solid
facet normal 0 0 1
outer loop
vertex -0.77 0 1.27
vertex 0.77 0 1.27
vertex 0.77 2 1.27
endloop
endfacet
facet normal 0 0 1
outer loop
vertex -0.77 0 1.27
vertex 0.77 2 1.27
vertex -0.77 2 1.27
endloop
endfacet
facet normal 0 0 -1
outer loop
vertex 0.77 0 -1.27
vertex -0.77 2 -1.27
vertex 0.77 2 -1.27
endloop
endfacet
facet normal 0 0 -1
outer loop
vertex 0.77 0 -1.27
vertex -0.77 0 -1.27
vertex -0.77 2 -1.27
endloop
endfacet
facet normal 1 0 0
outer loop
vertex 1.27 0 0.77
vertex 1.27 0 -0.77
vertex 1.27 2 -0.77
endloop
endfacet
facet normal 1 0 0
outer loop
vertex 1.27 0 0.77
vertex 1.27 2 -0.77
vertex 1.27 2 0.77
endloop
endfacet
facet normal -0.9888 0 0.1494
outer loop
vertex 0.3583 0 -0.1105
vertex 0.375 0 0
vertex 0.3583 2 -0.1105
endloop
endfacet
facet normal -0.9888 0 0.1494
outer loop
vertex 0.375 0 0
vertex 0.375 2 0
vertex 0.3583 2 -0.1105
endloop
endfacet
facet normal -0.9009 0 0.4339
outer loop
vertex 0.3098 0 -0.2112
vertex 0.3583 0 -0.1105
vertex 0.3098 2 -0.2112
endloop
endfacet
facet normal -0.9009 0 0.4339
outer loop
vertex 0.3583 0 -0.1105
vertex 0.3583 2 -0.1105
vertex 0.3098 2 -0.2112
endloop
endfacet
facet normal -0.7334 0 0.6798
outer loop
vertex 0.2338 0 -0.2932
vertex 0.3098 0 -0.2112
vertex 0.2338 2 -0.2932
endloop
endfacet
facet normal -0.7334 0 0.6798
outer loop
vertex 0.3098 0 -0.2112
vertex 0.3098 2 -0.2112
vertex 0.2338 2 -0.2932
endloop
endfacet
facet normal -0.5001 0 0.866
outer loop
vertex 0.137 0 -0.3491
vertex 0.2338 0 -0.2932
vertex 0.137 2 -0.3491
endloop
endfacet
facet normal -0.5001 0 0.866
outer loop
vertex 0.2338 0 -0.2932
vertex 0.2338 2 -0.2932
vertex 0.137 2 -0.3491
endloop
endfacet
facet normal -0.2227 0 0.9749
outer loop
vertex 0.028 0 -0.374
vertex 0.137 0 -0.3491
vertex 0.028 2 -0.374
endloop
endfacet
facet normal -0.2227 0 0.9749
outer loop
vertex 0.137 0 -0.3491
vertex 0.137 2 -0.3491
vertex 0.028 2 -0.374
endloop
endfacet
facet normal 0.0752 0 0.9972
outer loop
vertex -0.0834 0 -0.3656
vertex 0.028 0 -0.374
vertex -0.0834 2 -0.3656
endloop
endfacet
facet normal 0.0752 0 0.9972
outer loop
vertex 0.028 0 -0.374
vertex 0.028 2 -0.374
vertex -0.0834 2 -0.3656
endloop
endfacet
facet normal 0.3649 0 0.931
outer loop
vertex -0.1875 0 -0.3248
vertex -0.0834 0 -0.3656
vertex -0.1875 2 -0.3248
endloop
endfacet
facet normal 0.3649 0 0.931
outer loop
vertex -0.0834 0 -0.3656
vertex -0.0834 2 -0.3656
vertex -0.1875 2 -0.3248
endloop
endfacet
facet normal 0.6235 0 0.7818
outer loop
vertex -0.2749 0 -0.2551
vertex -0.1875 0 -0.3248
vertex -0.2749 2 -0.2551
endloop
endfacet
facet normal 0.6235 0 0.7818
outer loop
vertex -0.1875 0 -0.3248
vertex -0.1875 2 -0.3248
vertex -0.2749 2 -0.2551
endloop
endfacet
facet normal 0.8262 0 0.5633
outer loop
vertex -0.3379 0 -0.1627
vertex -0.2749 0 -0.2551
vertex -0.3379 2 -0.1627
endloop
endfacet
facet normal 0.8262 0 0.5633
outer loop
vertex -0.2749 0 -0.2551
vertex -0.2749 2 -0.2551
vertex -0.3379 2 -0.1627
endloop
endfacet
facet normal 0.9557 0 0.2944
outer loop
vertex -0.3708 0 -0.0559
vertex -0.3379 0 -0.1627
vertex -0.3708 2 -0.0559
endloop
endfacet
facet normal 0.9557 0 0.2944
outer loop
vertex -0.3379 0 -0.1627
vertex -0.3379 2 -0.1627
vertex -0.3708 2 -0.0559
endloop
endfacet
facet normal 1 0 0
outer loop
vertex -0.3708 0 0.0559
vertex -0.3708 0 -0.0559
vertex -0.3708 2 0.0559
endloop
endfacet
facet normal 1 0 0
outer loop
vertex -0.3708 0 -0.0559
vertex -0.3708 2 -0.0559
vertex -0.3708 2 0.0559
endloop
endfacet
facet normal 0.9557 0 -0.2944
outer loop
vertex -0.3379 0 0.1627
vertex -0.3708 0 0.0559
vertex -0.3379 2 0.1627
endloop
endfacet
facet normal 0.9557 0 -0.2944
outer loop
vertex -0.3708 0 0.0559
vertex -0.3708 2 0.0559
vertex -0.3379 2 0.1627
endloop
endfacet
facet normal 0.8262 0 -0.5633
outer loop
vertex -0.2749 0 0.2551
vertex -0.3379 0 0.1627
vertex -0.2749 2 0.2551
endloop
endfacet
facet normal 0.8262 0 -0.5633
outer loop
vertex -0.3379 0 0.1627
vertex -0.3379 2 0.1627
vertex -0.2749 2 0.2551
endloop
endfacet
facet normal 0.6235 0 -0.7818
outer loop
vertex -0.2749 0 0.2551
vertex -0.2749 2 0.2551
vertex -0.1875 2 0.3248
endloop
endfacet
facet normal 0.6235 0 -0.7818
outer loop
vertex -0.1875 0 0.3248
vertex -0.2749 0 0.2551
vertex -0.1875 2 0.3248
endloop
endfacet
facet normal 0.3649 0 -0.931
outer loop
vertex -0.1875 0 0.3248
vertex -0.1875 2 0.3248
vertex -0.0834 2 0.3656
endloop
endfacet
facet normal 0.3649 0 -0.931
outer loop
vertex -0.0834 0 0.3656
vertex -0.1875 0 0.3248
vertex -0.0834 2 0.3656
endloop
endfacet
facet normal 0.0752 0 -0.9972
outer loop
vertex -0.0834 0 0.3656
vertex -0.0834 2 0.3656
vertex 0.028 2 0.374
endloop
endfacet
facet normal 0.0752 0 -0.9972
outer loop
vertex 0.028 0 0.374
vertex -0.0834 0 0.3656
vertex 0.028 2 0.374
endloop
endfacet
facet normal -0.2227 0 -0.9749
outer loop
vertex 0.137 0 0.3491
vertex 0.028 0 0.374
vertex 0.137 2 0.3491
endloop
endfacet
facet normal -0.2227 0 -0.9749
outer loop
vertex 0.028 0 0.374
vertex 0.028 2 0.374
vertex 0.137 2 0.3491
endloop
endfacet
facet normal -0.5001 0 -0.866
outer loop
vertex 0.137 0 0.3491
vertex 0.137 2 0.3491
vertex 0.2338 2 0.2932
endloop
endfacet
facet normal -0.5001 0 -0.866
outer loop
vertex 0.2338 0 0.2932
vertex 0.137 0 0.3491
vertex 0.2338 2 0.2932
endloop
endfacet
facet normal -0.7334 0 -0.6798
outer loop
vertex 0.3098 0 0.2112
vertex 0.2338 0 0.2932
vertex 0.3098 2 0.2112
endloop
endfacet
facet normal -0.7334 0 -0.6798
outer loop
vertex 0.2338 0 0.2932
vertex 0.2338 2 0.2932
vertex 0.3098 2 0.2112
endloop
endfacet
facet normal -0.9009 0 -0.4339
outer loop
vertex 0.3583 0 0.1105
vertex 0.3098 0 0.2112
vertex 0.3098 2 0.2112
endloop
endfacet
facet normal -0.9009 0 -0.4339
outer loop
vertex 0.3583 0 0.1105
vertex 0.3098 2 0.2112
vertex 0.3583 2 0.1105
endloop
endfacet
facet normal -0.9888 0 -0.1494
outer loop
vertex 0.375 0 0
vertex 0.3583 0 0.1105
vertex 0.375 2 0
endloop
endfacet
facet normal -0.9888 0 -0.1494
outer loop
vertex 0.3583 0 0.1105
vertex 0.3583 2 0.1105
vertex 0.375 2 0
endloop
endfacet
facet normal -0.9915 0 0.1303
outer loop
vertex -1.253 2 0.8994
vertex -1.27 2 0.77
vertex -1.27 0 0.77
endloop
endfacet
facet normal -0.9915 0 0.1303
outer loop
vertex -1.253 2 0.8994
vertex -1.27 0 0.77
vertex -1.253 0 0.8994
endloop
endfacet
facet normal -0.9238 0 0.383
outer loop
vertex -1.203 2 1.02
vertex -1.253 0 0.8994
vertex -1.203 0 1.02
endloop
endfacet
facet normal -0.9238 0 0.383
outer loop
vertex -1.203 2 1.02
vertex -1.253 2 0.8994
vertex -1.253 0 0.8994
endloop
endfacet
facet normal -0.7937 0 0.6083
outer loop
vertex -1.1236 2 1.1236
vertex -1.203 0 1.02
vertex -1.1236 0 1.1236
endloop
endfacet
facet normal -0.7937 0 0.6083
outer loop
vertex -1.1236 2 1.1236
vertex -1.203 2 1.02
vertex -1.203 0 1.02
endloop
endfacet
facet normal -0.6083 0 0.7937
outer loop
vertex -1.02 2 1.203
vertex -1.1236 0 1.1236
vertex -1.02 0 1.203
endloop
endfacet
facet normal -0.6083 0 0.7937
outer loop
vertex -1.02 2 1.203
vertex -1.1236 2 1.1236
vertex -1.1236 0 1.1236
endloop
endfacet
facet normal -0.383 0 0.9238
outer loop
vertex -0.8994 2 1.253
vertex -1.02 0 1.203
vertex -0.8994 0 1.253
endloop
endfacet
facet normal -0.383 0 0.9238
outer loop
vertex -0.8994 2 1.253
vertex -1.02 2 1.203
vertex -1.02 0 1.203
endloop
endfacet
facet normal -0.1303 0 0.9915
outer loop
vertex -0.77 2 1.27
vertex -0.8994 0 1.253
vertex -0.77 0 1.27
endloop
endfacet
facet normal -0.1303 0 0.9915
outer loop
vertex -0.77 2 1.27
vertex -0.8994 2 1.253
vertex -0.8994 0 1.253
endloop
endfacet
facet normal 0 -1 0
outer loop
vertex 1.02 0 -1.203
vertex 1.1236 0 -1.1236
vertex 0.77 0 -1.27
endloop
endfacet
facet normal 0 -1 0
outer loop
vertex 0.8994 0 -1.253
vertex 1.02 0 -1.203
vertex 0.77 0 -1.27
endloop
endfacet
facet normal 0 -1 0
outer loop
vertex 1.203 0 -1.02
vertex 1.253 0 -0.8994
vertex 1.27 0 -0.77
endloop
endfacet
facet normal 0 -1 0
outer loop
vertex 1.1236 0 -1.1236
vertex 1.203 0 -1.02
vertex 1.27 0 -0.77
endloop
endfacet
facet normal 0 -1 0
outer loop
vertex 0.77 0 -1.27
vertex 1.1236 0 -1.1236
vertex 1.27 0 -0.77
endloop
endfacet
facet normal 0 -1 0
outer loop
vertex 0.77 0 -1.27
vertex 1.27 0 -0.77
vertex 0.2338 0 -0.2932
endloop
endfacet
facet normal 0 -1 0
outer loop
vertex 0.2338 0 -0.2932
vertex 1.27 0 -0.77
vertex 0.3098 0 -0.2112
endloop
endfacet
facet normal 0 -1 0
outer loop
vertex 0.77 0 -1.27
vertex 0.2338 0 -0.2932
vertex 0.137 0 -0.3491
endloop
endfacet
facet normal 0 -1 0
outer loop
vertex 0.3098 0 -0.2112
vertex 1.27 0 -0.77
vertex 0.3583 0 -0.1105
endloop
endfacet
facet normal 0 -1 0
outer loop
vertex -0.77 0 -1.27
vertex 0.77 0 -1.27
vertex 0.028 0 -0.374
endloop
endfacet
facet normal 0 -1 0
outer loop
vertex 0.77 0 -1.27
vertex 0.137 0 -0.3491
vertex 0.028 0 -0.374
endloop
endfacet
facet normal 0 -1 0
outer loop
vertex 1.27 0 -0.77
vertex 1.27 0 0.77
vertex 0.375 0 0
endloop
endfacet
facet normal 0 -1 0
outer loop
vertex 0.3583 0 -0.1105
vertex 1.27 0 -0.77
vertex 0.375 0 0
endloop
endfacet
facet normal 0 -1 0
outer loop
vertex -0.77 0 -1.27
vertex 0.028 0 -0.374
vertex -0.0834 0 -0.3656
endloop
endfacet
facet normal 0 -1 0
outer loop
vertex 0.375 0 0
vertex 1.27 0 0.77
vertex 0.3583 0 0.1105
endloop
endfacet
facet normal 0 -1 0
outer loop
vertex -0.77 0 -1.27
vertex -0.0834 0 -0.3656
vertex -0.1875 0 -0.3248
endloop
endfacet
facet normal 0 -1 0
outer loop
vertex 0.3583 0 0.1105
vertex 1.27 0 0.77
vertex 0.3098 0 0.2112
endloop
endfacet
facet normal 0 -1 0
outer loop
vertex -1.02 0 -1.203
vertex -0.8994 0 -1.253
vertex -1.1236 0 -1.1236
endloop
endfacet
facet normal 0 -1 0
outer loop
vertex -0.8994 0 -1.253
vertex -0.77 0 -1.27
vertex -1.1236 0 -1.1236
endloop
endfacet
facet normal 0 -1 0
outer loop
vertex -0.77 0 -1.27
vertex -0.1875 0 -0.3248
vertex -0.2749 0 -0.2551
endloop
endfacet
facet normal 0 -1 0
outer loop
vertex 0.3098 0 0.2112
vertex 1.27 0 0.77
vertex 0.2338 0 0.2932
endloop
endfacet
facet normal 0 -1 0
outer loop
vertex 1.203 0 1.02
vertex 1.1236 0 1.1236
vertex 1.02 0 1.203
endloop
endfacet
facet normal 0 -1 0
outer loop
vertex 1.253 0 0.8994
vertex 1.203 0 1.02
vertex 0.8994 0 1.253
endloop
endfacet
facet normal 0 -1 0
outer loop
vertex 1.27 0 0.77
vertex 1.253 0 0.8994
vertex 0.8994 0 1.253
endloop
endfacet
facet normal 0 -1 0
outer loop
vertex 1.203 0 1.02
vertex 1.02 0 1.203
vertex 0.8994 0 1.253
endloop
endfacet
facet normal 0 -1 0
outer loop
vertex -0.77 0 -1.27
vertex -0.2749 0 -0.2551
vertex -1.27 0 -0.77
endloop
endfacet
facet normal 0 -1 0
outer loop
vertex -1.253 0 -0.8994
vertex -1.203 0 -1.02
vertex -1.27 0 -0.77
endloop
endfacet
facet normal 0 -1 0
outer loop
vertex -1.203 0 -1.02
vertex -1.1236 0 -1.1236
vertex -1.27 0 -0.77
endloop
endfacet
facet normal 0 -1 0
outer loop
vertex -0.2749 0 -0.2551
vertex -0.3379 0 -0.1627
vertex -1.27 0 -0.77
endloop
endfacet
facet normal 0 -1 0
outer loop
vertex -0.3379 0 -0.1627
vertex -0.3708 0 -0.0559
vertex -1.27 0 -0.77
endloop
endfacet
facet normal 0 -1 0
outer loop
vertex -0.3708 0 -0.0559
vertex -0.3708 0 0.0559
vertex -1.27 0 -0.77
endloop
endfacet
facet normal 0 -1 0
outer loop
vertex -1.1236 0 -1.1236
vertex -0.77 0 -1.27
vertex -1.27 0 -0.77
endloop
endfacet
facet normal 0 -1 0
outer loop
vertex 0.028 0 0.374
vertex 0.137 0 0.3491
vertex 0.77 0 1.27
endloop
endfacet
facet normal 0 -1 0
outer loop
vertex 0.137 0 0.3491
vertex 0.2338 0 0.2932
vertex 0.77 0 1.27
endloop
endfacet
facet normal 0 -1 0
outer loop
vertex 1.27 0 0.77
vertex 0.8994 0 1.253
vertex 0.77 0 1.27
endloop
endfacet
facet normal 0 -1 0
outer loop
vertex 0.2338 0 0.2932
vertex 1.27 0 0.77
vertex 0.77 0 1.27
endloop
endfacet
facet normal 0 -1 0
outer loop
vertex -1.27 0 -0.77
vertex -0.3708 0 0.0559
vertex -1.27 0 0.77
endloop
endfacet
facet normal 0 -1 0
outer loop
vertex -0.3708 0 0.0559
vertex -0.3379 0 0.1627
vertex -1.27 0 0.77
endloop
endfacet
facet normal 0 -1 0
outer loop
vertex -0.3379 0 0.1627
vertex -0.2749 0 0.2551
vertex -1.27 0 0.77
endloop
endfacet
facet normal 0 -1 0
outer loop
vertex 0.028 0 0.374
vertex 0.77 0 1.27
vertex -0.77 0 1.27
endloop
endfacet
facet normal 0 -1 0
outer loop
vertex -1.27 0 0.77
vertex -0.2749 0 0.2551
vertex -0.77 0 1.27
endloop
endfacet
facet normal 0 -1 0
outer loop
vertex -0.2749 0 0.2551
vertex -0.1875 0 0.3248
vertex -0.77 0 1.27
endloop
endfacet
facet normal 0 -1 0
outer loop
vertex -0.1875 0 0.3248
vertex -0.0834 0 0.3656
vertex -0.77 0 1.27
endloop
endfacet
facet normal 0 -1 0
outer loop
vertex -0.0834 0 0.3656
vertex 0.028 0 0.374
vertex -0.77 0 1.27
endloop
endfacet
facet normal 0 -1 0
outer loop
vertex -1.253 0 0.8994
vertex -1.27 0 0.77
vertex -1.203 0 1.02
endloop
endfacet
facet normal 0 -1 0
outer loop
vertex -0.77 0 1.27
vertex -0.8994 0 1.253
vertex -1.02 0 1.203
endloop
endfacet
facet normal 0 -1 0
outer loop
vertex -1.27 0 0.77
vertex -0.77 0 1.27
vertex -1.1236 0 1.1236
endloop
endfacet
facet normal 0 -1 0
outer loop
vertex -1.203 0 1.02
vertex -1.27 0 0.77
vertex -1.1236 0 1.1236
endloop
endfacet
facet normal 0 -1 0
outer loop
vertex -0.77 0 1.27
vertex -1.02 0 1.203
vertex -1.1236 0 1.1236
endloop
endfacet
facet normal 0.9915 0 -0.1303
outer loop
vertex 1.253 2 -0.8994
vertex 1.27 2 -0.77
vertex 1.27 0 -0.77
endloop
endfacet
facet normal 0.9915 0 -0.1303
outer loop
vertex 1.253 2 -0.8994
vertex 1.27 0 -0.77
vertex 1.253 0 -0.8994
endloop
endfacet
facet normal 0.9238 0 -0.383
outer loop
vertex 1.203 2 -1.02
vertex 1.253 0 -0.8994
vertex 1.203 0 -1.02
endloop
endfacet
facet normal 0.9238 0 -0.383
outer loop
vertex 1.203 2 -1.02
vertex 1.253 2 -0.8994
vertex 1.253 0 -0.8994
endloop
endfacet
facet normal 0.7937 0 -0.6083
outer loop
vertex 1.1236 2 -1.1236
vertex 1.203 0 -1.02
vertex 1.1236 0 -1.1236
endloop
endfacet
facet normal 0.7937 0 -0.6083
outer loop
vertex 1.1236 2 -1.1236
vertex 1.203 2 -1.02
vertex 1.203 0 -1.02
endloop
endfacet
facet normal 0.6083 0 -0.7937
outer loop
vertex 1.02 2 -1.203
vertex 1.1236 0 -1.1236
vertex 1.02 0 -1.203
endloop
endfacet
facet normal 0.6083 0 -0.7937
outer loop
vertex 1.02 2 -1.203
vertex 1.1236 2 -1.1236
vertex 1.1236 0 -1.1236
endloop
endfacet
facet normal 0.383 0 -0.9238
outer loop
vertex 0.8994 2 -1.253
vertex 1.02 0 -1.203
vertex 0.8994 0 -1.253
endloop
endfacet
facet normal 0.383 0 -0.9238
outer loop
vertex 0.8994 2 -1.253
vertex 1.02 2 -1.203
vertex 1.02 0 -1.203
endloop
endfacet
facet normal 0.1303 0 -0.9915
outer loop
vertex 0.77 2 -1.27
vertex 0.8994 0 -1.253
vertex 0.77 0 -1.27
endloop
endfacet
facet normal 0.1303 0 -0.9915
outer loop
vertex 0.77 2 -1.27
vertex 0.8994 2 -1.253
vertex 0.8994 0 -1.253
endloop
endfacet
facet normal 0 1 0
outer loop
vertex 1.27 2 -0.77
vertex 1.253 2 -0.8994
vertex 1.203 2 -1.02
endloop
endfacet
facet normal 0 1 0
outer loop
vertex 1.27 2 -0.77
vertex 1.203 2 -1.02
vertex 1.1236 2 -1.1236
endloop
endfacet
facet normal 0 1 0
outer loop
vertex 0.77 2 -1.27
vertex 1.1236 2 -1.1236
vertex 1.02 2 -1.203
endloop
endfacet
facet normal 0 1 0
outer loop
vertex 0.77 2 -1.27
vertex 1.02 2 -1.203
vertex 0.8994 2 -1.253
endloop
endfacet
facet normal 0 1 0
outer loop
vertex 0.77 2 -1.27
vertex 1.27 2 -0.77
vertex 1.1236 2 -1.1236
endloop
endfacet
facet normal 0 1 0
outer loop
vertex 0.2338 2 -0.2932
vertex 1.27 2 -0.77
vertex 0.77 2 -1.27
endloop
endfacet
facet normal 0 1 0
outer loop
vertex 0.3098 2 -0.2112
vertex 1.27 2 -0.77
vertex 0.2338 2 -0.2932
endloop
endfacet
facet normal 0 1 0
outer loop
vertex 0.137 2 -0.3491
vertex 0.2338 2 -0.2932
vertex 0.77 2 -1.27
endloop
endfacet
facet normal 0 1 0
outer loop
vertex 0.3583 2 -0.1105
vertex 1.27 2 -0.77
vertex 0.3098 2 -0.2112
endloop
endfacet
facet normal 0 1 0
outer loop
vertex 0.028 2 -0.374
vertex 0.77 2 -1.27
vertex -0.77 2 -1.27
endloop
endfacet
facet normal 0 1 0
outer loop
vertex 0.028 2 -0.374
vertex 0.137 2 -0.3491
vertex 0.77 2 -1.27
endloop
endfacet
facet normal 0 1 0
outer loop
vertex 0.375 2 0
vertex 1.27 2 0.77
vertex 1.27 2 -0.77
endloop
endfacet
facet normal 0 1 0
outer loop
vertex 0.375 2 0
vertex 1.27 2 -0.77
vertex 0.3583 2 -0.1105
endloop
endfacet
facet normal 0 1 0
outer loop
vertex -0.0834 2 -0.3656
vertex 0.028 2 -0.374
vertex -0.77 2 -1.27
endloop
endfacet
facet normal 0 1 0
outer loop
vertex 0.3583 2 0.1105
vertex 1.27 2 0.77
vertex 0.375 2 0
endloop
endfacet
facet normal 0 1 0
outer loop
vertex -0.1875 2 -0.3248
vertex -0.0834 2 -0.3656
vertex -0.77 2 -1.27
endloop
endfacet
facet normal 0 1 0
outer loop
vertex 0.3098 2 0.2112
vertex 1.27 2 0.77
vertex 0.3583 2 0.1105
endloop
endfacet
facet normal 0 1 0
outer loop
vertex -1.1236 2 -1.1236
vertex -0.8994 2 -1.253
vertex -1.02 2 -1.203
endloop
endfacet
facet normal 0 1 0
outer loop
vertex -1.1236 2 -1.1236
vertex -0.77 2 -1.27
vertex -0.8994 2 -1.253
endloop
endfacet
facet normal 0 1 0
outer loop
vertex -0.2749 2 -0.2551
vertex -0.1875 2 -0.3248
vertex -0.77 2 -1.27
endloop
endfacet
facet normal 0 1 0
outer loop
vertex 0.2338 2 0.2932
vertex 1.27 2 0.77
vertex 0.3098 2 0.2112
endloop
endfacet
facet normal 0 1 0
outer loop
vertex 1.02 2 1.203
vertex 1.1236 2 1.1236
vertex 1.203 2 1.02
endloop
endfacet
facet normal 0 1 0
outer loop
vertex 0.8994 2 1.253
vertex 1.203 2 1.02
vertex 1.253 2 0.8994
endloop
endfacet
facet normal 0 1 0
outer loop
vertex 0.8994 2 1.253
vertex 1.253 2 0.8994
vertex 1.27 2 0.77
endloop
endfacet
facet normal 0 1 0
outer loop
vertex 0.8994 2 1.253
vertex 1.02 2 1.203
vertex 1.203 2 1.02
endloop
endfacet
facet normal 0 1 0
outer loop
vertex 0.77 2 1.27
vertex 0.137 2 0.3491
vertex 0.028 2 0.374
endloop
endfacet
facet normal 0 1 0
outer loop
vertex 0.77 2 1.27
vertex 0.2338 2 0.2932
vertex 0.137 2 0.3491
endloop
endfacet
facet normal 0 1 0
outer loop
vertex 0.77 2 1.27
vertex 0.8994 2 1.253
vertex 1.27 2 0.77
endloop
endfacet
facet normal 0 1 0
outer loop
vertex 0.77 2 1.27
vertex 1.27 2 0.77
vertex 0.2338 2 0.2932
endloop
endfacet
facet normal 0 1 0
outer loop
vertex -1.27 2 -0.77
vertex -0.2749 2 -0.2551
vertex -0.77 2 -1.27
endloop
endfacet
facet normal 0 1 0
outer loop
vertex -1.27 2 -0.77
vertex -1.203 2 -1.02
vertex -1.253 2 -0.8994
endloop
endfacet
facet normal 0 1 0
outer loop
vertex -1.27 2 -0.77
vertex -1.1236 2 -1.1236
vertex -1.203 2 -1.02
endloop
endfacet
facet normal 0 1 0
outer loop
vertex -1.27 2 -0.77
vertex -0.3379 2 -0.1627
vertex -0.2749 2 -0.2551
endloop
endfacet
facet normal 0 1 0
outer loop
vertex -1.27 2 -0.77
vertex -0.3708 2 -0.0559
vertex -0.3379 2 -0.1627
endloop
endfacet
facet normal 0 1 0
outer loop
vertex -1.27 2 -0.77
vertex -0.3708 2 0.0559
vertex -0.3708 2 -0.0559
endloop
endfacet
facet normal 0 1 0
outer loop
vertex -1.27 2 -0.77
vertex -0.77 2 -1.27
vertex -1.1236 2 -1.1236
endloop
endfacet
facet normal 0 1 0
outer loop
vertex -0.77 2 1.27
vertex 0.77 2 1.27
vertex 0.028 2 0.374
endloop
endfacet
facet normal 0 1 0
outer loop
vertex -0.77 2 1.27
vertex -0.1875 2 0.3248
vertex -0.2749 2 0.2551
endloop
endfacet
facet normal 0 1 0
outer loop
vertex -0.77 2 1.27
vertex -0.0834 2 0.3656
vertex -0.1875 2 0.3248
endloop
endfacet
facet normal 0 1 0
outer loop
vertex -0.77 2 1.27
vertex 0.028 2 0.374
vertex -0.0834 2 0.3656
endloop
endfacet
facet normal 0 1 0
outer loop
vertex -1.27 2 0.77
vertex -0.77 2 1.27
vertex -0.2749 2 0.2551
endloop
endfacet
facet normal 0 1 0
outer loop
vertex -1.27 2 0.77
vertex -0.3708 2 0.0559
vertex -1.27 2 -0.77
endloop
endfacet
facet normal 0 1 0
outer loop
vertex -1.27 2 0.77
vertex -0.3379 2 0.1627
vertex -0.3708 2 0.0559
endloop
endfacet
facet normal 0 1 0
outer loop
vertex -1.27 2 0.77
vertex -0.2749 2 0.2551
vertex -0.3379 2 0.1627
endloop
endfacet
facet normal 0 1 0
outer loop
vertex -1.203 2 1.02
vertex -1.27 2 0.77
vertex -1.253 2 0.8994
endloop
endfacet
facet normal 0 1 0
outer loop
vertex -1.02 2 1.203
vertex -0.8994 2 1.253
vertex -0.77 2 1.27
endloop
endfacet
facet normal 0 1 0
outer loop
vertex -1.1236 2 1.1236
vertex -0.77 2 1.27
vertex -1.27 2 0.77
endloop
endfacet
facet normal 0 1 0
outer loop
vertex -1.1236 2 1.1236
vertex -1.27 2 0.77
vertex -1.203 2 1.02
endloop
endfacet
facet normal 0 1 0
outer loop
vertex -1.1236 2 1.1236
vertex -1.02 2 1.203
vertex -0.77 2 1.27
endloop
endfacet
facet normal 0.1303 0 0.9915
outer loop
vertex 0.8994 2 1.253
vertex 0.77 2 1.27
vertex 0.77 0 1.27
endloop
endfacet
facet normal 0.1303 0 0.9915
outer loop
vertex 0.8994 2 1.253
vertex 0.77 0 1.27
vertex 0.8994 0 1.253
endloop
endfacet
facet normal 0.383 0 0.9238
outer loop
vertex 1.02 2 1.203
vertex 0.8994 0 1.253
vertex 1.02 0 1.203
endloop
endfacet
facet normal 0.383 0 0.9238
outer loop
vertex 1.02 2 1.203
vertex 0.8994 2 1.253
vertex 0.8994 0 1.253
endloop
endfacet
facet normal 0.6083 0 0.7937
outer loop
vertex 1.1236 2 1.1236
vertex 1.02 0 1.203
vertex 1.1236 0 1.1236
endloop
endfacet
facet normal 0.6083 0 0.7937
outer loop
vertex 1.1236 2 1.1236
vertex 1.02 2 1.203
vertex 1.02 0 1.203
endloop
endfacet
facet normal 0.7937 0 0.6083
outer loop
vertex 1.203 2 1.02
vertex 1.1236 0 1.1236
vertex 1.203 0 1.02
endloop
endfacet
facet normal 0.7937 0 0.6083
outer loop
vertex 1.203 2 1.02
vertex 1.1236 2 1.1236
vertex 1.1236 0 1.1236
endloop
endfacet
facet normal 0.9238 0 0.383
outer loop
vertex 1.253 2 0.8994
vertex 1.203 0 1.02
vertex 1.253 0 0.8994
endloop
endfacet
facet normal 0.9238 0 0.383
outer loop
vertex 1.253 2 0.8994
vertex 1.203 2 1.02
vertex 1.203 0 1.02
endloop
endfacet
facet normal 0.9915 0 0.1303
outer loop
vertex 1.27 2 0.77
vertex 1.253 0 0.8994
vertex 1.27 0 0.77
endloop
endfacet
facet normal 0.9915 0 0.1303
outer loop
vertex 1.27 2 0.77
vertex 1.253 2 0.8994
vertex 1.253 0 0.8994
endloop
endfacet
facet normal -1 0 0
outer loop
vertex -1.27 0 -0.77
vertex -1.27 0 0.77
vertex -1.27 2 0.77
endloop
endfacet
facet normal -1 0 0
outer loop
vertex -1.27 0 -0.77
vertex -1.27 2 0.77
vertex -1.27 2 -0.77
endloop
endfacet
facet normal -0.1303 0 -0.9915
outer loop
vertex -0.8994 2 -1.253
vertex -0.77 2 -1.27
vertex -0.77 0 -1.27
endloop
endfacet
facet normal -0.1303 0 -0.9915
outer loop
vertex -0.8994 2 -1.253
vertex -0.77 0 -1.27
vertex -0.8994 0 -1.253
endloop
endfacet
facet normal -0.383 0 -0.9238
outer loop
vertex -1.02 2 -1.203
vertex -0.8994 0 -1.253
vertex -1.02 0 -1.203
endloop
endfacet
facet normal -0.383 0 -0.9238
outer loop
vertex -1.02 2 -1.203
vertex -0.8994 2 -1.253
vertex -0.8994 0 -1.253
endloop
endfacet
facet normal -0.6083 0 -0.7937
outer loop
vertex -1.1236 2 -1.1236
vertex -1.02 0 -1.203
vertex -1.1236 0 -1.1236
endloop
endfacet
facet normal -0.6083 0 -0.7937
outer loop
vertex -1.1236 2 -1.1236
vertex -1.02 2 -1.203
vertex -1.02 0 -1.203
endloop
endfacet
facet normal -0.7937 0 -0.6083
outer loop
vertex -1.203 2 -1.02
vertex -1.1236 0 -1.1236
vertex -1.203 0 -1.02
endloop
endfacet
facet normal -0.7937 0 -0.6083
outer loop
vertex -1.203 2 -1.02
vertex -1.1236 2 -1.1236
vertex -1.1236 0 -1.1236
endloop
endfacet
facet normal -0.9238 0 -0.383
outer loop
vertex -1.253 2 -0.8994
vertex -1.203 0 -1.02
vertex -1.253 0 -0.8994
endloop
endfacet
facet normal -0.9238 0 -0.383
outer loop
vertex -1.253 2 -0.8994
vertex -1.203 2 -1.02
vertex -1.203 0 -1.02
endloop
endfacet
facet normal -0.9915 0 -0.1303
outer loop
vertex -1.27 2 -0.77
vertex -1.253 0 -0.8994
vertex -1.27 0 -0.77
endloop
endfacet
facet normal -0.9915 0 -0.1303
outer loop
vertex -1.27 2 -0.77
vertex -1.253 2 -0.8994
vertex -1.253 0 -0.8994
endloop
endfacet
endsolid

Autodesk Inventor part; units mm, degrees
ref_plane "YZ Plane" through (0, 0, 0) normal (1, 0, 0) x (0, 1, 0)
ref_plane "XZ Plane" through (0, 0, 0) normal (0, 1, 0) x (-1, 0, 0)
ref_plane "XY Plane" through (0, 0, 0) normal (0, 0, 1) x (1, 0, 0)
sketch "Sketch1" plane through (0, 0, 0) normal (0, 1, 0) x (-1, 0, 0)
  line L0 (-1.27, 1.27) -> (1.27, 1.27)
  line L1 (1.27, 1.27) -> (1.27, -1.27)
  line L2 (1.27, -1.27) -> (-1.27, -1.27)
  line L3 (-1.27, -1.27) -> (-1.27, 1.27)
  line L4 (-1.27, 1.27) -> (1.27, -1.27) construction
  line L5 (1.27, 1.27) -> (-1.27, -1.27) construction
  point P0 (0, 0)
  dimension "d0" = 2.54
  dimension "d1" = 2.54
extrude "Extrusion1" add sketch "Sketch1" along normal blind 2
sketch "Sketch2" plane through (0, 2, 0) normal (0, 1, 0) x (1, 0, 0)
  circle A0 centre (0, 0) radius 0.375
  dimension "d4" = 0.75
extrude "Extrusion2" cut sketch "Sketch2" against normal blind 3
fillet "Fillet1" radius 0.5 4 edges at (-1.27, 1, 1.27) (1.27, 1, 1.27) (1.27, 1, -1.27) (-1.27, 1, -1.27)
properties part number "block"
